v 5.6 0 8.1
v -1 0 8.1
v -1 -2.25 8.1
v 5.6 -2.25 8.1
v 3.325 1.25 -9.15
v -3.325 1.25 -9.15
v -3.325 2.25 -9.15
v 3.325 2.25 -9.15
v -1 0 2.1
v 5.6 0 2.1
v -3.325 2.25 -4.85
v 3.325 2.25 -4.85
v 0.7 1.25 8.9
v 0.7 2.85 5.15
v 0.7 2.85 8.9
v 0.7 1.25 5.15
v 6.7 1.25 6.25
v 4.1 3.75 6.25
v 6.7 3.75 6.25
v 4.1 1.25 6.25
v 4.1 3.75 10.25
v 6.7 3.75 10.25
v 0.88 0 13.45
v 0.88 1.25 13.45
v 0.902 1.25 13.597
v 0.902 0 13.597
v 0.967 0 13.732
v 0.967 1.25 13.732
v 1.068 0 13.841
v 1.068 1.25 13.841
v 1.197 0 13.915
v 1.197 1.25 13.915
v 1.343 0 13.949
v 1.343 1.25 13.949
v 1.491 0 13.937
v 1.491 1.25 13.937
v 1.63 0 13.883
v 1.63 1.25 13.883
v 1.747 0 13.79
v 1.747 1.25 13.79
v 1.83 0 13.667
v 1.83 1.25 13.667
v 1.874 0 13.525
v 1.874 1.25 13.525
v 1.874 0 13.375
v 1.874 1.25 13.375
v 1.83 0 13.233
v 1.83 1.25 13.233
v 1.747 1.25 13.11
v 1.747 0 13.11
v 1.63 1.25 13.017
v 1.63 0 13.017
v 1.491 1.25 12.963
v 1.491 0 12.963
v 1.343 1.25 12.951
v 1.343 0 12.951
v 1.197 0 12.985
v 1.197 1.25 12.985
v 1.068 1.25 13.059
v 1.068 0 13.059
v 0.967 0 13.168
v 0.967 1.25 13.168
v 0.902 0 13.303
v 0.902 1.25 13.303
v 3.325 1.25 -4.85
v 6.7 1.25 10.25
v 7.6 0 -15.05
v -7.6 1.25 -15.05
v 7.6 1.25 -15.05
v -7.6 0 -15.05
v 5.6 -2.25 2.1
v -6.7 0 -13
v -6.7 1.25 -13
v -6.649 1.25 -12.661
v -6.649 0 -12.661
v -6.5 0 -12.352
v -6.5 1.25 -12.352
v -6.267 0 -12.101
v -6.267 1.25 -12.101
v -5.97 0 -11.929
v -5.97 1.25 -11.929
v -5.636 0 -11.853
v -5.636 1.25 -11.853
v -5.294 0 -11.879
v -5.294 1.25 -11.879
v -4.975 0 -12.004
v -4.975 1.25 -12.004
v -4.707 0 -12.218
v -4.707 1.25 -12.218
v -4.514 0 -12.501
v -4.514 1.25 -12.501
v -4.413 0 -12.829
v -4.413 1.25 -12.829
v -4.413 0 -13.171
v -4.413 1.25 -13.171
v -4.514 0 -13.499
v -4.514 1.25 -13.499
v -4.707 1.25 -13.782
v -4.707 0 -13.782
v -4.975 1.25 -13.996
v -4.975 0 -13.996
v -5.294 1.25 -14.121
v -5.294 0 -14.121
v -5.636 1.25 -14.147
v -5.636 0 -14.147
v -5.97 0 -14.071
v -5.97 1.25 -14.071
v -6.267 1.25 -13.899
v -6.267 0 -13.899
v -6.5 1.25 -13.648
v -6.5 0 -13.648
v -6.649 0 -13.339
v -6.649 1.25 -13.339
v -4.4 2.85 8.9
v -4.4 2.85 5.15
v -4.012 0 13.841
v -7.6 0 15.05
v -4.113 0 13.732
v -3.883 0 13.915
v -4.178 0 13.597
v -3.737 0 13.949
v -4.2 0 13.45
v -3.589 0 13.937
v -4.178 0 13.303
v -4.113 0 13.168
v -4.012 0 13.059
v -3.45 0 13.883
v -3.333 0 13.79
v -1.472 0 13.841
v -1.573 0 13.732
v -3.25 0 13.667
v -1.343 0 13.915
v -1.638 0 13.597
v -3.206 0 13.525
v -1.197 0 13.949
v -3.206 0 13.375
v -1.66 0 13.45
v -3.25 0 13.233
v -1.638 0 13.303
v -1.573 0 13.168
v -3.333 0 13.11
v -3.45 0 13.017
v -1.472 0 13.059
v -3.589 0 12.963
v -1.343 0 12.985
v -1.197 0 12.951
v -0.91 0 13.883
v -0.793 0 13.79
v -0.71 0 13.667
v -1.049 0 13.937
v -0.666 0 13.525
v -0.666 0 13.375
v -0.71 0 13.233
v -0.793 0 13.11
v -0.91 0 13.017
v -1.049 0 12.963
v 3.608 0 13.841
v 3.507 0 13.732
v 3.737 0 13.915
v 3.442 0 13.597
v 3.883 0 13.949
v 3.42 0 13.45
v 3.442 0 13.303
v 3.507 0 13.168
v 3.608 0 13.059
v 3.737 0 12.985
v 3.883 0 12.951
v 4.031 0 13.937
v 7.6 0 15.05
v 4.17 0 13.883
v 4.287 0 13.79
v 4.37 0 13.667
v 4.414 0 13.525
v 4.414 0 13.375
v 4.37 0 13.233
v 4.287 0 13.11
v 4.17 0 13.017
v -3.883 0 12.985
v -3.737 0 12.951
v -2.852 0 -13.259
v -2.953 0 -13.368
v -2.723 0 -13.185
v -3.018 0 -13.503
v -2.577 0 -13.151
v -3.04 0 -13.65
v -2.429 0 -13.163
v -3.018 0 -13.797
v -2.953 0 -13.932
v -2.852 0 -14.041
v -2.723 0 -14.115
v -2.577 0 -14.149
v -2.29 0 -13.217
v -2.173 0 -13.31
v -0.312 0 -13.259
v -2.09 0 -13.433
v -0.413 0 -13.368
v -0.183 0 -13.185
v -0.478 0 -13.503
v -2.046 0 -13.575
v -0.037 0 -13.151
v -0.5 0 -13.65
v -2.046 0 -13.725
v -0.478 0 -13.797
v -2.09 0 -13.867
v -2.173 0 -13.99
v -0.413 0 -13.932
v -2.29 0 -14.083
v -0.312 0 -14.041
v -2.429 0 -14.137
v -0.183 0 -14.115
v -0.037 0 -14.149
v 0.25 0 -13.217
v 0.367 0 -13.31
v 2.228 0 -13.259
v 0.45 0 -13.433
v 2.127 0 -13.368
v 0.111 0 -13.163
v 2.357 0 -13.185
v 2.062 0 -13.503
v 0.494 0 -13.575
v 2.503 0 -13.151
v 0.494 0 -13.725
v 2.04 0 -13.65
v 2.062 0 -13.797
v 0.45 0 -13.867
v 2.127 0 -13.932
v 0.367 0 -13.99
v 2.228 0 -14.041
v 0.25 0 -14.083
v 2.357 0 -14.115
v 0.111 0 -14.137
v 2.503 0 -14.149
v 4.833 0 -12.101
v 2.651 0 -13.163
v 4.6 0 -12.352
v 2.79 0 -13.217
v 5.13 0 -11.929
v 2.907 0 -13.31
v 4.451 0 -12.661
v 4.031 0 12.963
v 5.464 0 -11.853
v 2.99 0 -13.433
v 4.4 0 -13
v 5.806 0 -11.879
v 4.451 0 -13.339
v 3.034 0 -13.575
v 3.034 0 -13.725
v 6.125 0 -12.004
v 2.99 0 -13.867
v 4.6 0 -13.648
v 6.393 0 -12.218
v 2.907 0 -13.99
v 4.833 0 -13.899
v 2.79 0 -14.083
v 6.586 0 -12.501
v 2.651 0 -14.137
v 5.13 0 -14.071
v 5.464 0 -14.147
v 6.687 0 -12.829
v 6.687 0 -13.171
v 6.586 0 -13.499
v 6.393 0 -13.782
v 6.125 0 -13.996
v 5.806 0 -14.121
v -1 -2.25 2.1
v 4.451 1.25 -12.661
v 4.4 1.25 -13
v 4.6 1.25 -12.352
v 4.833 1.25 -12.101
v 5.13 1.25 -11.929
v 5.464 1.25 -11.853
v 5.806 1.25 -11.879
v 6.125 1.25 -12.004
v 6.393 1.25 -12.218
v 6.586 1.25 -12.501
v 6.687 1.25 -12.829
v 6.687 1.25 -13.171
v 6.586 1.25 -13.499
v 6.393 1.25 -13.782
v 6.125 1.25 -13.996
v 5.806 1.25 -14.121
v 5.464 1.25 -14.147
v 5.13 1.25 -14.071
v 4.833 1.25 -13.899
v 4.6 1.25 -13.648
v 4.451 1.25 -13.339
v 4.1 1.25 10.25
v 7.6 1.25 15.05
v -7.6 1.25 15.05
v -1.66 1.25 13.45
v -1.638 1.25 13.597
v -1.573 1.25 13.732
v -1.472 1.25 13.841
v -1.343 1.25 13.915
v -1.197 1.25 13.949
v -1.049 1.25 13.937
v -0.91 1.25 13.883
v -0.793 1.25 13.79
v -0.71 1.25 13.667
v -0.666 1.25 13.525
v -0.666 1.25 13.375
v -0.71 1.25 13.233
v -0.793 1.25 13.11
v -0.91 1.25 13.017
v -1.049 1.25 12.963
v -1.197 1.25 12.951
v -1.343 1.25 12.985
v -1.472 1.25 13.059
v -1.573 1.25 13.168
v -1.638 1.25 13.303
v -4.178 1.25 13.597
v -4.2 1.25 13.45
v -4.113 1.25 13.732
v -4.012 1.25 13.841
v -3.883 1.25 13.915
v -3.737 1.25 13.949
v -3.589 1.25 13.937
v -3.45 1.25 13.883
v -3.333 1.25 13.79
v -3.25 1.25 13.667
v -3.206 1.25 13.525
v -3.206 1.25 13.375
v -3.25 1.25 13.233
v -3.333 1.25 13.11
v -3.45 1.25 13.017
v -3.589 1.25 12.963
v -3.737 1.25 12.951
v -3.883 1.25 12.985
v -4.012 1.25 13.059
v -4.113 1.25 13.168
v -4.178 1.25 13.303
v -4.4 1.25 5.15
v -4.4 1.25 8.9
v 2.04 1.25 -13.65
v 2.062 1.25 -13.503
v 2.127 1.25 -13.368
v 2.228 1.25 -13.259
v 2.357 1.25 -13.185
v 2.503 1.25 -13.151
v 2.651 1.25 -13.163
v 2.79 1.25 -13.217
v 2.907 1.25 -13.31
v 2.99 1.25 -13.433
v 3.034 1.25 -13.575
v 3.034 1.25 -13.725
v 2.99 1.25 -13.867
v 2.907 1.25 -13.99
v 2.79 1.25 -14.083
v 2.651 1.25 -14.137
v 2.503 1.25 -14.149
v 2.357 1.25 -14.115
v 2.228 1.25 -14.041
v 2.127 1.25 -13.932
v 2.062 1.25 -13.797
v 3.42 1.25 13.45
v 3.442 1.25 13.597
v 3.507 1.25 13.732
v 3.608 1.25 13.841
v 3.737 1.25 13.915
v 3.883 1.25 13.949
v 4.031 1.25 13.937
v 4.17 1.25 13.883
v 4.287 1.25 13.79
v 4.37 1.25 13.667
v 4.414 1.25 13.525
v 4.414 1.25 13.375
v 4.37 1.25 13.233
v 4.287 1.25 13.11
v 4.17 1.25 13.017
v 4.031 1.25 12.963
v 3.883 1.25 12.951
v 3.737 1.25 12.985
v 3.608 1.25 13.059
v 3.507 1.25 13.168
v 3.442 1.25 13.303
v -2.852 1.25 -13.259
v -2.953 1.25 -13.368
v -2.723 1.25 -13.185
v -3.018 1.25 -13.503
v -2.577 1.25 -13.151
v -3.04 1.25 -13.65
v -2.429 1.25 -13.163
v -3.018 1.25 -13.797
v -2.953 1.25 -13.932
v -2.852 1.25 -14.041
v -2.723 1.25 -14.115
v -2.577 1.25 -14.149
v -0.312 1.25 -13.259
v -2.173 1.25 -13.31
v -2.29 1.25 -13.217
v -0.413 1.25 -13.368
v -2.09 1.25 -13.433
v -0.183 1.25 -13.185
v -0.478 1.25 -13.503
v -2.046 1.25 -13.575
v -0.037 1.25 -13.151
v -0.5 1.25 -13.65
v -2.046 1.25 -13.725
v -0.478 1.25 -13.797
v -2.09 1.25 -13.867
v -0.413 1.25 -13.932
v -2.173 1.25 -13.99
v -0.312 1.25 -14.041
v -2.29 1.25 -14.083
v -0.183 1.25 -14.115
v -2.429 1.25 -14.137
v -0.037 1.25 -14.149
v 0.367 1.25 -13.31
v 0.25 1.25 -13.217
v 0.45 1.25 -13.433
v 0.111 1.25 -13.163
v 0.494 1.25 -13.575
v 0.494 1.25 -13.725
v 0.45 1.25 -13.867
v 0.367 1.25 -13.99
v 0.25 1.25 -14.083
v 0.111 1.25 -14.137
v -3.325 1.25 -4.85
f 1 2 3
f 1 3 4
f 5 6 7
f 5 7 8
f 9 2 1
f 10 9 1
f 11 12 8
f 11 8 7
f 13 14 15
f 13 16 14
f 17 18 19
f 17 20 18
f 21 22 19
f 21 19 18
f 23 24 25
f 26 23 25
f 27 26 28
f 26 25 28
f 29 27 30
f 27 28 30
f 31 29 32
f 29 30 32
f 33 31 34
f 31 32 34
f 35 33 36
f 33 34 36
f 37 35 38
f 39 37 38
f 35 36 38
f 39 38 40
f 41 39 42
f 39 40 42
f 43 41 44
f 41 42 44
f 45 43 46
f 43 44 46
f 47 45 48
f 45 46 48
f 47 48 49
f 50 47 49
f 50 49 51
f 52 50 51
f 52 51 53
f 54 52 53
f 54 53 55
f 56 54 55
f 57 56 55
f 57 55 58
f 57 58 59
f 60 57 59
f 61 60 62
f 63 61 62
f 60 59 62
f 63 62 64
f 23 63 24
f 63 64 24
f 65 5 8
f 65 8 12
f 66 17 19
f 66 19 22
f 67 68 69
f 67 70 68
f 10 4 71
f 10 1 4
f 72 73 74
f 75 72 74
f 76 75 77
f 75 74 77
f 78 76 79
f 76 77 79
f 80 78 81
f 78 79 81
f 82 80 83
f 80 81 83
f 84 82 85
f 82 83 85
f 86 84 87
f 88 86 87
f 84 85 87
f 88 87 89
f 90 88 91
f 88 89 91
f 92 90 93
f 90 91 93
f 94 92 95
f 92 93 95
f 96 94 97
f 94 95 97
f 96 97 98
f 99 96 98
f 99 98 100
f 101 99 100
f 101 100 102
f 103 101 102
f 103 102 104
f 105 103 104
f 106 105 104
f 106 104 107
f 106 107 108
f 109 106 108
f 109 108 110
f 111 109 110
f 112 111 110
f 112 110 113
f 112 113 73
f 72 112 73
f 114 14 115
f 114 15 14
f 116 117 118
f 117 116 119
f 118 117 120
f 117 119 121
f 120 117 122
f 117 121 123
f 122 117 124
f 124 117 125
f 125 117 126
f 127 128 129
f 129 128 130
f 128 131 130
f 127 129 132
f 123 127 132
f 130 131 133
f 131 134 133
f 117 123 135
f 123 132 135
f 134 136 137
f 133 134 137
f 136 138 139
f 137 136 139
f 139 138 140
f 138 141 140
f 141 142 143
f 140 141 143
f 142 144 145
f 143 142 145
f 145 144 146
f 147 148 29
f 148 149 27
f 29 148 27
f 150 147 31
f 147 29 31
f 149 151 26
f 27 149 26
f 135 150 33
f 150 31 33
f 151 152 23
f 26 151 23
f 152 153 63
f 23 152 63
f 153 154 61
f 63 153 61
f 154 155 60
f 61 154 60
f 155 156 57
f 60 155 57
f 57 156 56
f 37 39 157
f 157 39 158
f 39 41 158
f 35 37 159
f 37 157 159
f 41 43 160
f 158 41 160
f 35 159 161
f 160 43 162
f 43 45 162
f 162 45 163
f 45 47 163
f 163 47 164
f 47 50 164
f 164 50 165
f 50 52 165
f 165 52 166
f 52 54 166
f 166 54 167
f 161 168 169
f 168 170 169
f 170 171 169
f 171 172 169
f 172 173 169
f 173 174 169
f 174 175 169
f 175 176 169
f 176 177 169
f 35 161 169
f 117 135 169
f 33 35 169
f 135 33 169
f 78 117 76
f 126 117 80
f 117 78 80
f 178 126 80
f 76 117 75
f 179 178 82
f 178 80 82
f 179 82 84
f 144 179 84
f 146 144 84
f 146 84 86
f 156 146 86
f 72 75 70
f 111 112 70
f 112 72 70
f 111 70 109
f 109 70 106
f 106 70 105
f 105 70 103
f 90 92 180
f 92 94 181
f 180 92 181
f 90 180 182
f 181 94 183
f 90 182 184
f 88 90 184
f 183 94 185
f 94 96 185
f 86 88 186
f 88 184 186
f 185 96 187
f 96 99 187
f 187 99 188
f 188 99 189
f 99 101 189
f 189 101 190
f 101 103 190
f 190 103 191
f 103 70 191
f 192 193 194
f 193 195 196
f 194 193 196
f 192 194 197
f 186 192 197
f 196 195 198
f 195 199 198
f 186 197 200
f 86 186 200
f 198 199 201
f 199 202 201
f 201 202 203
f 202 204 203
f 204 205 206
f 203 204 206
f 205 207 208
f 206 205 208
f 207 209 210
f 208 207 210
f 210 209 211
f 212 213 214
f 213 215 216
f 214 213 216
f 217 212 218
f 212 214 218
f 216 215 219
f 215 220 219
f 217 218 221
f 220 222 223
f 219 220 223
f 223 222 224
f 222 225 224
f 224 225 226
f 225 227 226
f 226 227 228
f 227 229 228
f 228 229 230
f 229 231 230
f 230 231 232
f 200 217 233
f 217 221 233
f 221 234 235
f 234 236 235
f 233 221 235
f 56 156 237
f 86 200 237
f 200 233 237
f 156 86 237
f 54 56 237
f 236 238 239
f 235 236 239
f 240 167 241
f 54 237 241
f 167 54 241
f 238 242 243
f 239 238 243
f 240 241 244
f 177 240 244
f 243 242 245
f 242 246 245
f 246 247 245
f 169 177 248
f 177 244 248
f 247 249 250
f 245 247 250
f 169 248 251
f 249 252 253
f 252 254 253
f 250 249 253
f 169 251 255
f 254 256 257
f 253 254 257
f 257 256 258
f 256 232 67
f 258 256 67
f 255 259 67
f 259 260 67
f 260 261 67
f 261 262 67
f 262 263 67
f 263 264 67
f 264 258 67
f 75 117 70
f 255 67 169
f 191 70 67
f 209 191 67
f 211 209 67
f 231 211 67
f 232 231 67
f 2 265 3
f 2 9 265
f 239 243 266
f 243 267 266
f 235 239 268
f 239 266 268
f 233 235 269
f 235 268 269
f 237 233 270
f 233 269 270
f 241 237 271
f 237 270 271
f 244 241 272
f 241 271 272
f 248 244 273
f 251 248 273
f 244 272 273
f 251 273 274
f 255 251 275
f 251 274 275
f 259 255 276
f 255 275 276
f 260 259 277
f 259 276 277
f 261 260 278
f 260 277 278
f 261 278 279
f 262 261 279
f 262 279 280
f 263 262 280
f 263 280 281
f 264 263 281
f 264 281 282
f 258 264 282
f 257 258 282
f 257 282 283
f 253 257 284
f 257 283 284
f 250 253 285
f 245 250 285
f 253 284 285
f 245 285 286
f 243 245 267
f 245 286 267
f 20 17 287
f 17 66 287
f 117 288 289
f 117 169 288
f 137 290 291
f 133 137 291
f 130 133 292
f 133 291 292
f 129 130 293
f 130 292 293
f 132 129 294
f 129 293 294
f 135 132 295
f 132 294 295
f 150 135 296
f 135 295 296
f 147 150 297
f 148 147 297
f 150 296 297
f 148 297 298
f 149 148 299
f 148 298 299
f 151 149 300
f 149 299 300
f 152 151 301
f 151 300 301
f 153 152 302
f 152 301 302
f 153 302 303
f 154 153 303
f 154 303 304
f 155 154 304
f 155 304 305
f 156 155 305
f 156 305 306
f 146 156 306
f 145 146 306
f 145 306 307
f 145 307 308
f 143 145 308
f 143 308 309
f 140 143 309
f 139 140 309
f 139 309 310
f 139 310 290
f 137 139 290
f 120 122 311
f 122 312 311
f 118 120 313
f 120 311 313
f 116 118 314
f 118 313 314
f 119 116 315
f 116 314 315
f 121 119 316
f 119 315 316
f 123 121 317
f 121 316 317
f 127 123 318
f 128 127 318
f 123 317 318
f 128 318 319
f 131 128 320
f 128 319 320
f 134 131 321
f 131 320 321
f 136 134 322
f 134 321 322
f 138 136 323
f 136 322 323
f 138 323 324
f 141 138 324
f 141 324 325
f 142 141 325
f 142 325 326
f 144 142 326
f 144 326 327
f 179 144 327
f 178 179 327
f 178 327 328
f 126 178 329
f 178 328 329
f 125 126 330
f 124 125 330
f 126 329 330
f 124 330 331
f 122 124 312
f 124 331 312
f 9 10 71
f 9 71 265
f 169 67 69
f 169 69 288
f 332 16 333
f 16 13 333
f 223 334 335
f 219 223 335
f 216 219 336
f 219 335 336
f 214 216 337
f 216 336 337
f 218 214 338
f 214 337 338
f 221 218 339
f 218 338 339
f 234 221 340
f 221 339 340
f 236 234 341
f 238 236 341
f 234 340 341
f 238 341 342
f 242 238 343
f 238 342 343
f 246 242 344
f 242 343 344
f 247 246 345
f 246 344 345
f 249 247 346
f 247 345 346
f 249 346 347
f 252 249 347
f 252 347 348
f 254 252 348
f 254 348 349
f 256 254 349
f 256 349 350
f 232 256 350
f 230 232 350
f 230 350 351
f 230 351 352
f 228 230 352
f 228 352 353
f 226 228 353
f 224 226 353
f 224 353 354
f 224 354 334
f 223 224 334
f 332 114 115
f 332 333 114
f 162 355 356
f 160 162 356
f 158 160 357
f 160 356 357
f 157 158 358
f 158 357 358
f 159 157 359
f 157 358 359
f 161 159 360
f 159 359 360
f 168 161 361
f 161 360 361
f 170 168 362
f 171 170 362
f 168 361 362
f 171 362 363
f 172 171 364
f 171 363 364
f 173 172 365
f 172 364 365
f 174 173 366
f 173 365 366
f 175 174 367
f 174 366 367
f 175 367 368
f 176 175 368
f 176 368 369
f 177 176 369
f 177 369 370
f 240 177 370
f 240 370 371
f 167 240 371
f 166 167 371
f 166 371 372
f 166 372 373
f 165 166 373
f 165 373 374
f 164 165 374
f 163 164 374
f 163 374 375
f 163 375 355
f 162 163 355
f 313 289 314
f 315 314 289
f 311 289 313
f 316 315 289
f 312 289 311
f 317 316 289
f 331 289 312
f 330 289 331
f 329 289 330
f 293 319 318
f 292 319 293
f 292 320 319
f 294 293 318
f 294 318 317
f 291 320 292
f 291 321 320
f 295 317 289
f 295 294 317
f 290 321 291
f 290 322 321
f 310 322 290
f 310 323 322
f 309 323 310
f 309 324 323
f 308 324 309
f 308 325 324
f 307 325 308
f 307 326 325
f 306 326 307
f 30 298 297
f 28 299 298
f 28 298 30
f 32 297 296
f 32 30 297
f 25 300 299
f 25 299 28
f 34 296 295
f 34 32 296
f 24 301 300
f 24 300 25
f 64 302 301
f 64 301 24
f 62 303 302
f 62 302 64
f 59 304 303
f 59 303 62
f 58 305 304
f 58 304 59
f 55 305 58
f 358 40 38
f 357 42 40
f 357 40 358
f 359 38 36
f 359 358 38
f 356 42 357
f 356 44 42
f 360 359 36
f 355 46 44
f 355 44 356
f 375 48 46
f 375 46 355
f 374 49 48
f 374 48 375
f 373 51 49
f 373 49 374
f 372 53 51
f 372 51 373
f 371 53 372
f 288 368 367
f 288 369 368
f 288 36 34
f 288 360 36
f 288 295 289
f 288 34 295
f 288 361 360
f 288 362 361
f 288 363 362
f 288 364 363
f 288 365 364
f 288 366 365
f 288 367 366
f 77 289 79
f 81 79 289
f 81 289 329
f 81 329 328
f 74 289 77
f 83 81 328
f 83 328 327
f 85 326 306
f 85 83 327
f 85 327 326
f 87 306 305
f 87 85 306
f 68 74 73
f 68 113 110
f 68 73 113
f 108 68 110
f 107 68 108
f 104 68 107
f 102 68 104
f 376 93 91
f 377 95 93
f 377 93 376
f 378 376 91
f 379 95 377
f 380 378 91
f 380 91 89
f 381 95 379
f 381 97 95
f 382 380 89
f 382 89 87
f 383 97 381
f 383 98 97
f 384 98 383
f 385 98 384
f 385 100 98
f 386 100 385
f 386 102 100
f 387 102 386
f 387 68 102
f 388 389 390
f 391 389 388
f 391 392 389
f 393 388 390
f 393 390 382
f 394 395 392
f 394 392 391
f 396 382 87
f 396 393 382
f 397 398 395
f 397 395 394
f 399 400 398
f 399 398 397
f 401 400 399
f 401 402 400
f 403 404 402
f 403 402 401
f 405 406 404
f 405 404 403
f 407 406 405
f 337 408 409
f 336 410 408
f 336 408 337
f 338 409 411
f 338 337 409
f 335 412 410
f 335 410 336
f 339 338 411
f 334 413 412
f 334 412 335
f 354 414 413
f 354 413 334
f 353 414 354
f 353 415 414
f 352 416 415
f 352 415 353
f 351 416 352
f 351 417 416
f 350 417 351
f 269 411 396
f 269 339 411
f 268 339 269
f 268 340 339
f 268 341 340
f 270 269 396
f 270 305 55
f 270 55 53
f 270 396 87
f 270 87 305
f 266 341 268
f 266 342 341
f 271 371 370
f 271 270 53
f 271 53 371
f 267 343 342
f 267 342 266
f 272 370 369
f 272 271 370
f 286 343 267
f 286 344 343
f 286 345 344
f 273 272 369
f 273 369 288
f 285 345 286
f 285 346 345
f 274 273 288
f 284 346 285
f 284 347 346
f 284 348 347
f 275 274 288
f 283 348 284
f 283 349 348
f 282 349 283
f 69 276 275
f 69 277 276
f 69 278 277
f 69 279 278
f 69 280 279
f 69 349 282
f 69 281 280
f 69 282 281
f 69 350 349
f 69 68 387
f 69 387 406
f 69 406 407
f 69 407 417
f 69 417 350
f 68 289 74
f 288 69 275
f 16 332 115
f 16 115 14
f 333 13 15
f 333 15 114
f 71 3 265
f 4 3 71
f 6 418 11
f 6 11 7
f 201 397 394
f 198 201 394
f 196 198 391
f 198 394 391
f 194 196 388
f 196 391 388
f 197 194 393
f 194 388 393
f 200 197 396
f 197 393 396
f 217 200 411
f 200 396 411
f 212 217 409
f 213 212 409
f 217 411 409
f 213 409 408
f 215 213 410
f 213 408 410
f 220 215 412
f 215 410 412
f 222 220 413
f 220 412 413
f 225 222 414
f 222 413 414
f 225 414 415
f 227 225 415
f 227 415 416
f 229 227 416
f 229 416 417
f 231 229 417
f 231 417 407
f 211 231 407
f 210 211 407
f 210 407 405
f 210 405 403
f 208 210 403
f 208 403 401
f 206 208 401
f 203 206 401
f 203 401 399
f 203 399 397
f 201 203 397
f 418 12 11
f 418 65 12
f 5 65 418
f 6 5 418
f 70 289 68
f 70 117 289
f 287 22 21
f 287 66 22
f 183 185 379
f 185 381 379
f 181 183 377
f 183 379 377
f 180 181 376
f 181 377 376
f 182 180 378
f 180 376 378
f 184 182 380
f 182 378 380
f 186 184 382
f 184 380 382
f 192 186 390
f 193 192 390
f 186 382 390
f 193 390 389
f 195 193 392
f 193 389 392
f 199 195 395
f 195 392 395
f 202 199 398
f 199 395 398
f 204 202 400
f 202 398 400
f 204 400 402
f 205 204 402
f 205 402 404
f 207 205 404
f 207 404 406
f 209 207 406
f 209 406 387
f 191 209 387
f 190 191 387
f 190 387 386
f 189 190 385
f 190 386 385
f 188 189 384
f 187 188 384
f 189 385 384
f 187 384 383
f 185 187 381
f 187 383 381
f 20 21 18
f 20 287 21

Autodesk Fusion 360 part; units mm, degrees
sketch "pcb-base" plane through (0, 0, 0) normal (0, 1, 0) x (1, 0, 0)
  line L0 (7.6, -15.05) -> (-7.6, -15.05)
  line L1 (-7.6, -15.05) -> (-7.6, 15.05)
  line L2 (-7.6, 15.05) -> (7.6, 15.05)
  line L3 (7.6, 15.05) -> (7.6, -15.05)
  line L4 (7.6, -15.05) -> (-7.6, 15.05) construction
  line L5 (-7.6, -15.05) -> (7.6, 15.05) construction
  dimension "d1" = 15.2
  dimension "d2" = 30.1
extrude "Extrude1" add sketch "pcb-base" along normal blind 1.25 makes body 1
sketch "pcb-feat-mount-holes" plane through (0, 1.25, 0) normal (0, 1, 0) x (-1, 0, 0)
  line L0 (-7.6, -15.05) -> (7.6, -15.05)
  line L1 (7.6, -15.05) -> (7.6, 15.05)
  line L2 (7.6, 15.05) -> (-7.6, 15.05)
  line L3 (-7.6, 15.05) -> (-7.6, -15.05)
  circle A0 centre (5.55, -13) radius 1.15
  line L4 (0, 0) -> (0, -15.05) construction
  line L5 (0, 0) -> (7.6, 0) construction
  circle A1 centre (-5.55, -13) radius 1.15
  dimension "d5" = 2.3
  dimension "d6" = 0.9
  dimension "d7" = 0.9
extrude "Extrude2" cut sketch "pcb-feat-mount-holes" against normal blind 1.25 contours A0 | A1 bodies 1
sketch "pcb-feat-terminals" plane through (0, 1.25, 0) normal (0, 1, 0) x (-1, 0, 0)
  circle A0 centre (5.55, -13) radius 1.15
  circle A1 centre (-5.55, -13) radius 1.15
  line L0 (-7.6, -15.05) -> (7.6, -15.05)
  line L1 (7.6, -15.05) -> (7.6, 15.05)
  line L2 (7.6, 15.05) -> (-7.6, 15.05)
  line L3 (-7.6, 15.05) -> (-7.6, -15.05)
  line L4 (2.54, -13.65) -> (-2.54, -13.65) construction
  circle A2 centre (2.54, -13.65) radius 0.5
  circle A3 centre (0, -13.65) radius 0.5
  circle A4 centre (-2.54, -13.65) radius 0.5
  line L5 (0, -15.05) -> (0, -11.6799) construction
  line L6 (7.6, 13.45) -> (-7.6, 13.45) construction
  circle A5 centre (3.7, 13.45) radius 0.5
  circle A6 centre (1.16, 13.45) radius 0.5
  circle A7 centre (-1.38, 13.45) radius 0.5
  circle A8 centre (-3.92, 13.45) radius 0.5
  dimension "d10" = 1
  dimension "d11" = 1
  dimension "d12" = 2.54
  dimension "d14" = 1
  dimension "d16" = 2.54
  dimension "d17" = 0.9
  dimension "d18" = 1
  dimension "d19" = 1.1
  dimension "d20" = 3.4
  dimension "d21" = 1
  dimension "d22" = 1
  dimension "d23" = 1
  dimension "d24" = 2.54
  dimension "d25" = 2.54
  dimension "d26" = 2.54
extrude "Extrude3" cut sketch "pcb-feat-terminals" against normal blind 1.25 contours A2 | A3 | A4 | A5 | A6 | A7 | A8 bodies 1
sketch "pcb-feat-mcu" plane through (0, 1.25, 0) normal (0, 1, 0) x (-1, 0, 0)
  circle A0 centre (1.16, 13.45) radius 0.5
  circle A1 centre (2.54, -13.65) radius 0.5
  circle A2 centre (3.7, 13.45) radius 0.5
  circle A3 centre (-1.38, 13.45) radius 0.5
  circle A4 centre (0, -13.65) radius 0.5
  circle A5 centre (-2.54, -13.65) radius 0.5
  circle A6 centre (-3.92, 13.45) radius 0.5
  circle A7 centre (5.55, -13) radius 1.15
  circle A8 centre (-5.55, -13) radius 1.15
  line L0 (-7.6, -15.05) -> (7.6, -15.05)
  line L1 (7.6, -15.05) -> (7.6, 15.05)
  line L2 (7.6, 15.05) -> (-7.6, 15.05)
  line L3 (-7.6, 15.05) -> (-7.6, -15.05)
  line L4 (-3.325, -4.85) -> (3.325, -4.85)
  line L5 (3.325, -4.85) -> (3.325, -9.15)
  line L6 (3.325, -9.15) -> (-3.325, -9.15)
  line L7 (-3.325, -9.15) -> (-3.325, -4.85)
  line L8 (-3.325, -4.85) -> (3.325, -9.15) construction
  line L9 (3.325, -4.85) -> (-3.325, -9.15) construction
  line L10 (0, -15.05) -> (0, 0) construction
  point P0 (0, -7)
  dimension "d29" = 6.65
  dimension "d30" = 4.3
  dimension "d31" = 5.9
extrude "Extrude1'" add sketch "pcb-feat-mcu" along normal blind 1 separate body contours L4 L5 L6 L7 makes body 2 in component "Component"
sketch "pcb-feat-mcu-2" plane through (0, 1.25, 0) normal (0, 1, 0) x (-1, 0, 0)
  circle A0 centre (1.16, 13.45) radius 0.5
  circle A1 centre (2.54, -13.65) radius 0.5
  circle A2 centre (3.7, 13.45) radius 0.5
  circle A3 centre (-1.38, 13.45) radius 0.5
  circle A4 centre (0, -13.65) radius 0.5
  circle A5 centre (-2.54, -13.65) radius 0.5
  circle A6 centre (-3.92, 13.45) radius 0.5
  circle A7 centre (5.55, -13) radius 1.15
  circle A8 centre (-5.55, -13) radius 1.15
  line L0 (-7.6, -15.05) -> (7.6, -15.05)
  line L1 (7.6, -15.05) -> (7.6, 15.05)
  line L2 (7.6, 15.05) -> (-7.6, 15.05)
  line L3 (-7.6, 15.05) -> (-7.6, -15.05)
  line L4 (-0.7, 8.9) -> (4.4, 8.9)
  line L5 (4.4, 8.9) -> (4.4, 5.15)
  line L6 (4.4, 5.15) -> (-0.7, 5.15)
  line L7 (-0.7, 5.15) -> (-0.7, 8.9)
  line L8 (-0.7, 8.9) -> (4.4, 5.15) construction
  line L9 (4.4, 8.9) -> (-0.7, 5.15) construction
  point P0 (1.85, 7.025)
  dimension "d34" = 5.1
  dimension "d35" = 3.75
  dimension "d36" = 3.2
  dimension "d37" = 6.15
extrude "Extrude4" add sketch "pcb-feat-mcu-2" along normal blind 1.6 separate body contours L4 L5 L6 L7 makes body 3
sketch "pcb-feat-diode" plane through (0, 1.25, 0) normal (0, 1, 0) x (-1, 0, 0)
  circle A0 centre (1.16, 13.45) radius 0.5
  circle A1 centre (2.54, -13.65) radius 0.5
  circle A2 centre (3.7, 13.45) radius 0.5
  circle A3 centre (-1.38, 13.45) radius 0.5
  circle A4 centre (0, -13.65) radius 0.5
  circle A5 centre (-2.54, -13.65) radius 0.5
  circle A6 centre (-3.92, 13.45) radius 0.5
  circle A7 centre (5.55, -13) radius 1.15
  circle A8 centre (-5.55, -13) radius 1.15
  line L0 (-7.6, -15.05) -> (7.6, -15.05)
  line L1 (7.6, -15.05) -> (7.6, 15.05)
  line L2 (7.6, 15.05) -> (-7.6, 15.05)
  line L3 (-7.6, 15.05) -> (-7.6, -15.05)
  line L4 (-6.7, 10.25) -> (-4.1, 10.25)
  line L5 (-4.1, 10.25) -> (-4.1, 6.25)
  line L6 (-4.1, 6.25) -> (-6.7, 6.25)
  line L7 (-6.7, 6.25) -> (-6.7, 10.25)
  line L8 (-6.7, 10.25) -> (-4.1, 6.25) construction
  line L9 (-4.1, 10.25) -> (-6.7, 6.25) construction
  point P0 (-5.4, 8.25)
  dimension "d40" = 2.6
  dimension "d41" = 4
  dimension "d42" = 0.9
  dimension "d43" = 4.8
extrude "Extrude5" add sketch "pcb-feat-diode" along normal blind 2.5 separate body contours L4 L5 L6 L7 makes body 4
sketch "pcb-feat-vdd-reg" plane through (0, 0, 0) normal (0, -1, 0) x (1, 0, 0)
  circle A0 centre (-1.16, 13.45) radius 0.5
  circle A1 centre (-2.54, -13.65) radius 0.5
  circle A2 centre (-3.7, 13.45) radius 0.5
  circle A3 centre (1.38, 13.45) radius 0.5
  circle A4 centre (0, -13.65) radius 0.5
  circle A5 centre (2.54, -13.65) radius 0.5
  circle A6 centre (3.92, 13.45) radius 0.5
  circle A7 centre (-5.55, -13) radius 1.15
  circle A8 centre (5.55, -13) radius 1.15
  line L0 (-7.6, -15.05) -> (7.6, -15.05)
  line L1 (7.6, -15.05) -> (7.6, 15.05)
  line L2 (7.6, 15.05) -> (-7.6, 15.05)
  line L3 (-7.6, 15.05) -> (-7.6, -15.05)
  line L4 (-1, 8.1) -> (5.6, 8.1)
  line L5 (5.6, 8.1) -> (5.6, 2.1)
  line L6 (5.6, 2.1) -> (-1, 2.1)
  line L7 (-1, 2.1) -> (-1, 8.1)
  line L8 (-1, 8.1) -> (5.6, 2.1) construction
  line L9 (5.6, 8.1) -> (-1, 2.1) construction
  point P0 (2.3, 5.1)
  dimension "d46" = 6.6
  dimension "d47" = 6
  dimension "d48" = 2
  dimension "d49" = 6.95
extrude "Extrude6" add sketch "pcb-feat-vdd-reg" along normal blind 2.25 separate body contours L4 L5 L6 L7 makes body 5
component "Component" placed x (1, 0, 0) y (0, 1, 0) z (0, 0, 1) at (0, 0, 0)
equation "d6 = d7"
equation "d11 = d10"
equation "d14 = d11"
equation "d16 = d12"
equation "d18 = d10"
equation "d21 = d10"
equation "d22 = d10"
equation "d23 = d10"
equation "d24 = d12"
equation "d25 = d12"
equation "d26 = d12"
